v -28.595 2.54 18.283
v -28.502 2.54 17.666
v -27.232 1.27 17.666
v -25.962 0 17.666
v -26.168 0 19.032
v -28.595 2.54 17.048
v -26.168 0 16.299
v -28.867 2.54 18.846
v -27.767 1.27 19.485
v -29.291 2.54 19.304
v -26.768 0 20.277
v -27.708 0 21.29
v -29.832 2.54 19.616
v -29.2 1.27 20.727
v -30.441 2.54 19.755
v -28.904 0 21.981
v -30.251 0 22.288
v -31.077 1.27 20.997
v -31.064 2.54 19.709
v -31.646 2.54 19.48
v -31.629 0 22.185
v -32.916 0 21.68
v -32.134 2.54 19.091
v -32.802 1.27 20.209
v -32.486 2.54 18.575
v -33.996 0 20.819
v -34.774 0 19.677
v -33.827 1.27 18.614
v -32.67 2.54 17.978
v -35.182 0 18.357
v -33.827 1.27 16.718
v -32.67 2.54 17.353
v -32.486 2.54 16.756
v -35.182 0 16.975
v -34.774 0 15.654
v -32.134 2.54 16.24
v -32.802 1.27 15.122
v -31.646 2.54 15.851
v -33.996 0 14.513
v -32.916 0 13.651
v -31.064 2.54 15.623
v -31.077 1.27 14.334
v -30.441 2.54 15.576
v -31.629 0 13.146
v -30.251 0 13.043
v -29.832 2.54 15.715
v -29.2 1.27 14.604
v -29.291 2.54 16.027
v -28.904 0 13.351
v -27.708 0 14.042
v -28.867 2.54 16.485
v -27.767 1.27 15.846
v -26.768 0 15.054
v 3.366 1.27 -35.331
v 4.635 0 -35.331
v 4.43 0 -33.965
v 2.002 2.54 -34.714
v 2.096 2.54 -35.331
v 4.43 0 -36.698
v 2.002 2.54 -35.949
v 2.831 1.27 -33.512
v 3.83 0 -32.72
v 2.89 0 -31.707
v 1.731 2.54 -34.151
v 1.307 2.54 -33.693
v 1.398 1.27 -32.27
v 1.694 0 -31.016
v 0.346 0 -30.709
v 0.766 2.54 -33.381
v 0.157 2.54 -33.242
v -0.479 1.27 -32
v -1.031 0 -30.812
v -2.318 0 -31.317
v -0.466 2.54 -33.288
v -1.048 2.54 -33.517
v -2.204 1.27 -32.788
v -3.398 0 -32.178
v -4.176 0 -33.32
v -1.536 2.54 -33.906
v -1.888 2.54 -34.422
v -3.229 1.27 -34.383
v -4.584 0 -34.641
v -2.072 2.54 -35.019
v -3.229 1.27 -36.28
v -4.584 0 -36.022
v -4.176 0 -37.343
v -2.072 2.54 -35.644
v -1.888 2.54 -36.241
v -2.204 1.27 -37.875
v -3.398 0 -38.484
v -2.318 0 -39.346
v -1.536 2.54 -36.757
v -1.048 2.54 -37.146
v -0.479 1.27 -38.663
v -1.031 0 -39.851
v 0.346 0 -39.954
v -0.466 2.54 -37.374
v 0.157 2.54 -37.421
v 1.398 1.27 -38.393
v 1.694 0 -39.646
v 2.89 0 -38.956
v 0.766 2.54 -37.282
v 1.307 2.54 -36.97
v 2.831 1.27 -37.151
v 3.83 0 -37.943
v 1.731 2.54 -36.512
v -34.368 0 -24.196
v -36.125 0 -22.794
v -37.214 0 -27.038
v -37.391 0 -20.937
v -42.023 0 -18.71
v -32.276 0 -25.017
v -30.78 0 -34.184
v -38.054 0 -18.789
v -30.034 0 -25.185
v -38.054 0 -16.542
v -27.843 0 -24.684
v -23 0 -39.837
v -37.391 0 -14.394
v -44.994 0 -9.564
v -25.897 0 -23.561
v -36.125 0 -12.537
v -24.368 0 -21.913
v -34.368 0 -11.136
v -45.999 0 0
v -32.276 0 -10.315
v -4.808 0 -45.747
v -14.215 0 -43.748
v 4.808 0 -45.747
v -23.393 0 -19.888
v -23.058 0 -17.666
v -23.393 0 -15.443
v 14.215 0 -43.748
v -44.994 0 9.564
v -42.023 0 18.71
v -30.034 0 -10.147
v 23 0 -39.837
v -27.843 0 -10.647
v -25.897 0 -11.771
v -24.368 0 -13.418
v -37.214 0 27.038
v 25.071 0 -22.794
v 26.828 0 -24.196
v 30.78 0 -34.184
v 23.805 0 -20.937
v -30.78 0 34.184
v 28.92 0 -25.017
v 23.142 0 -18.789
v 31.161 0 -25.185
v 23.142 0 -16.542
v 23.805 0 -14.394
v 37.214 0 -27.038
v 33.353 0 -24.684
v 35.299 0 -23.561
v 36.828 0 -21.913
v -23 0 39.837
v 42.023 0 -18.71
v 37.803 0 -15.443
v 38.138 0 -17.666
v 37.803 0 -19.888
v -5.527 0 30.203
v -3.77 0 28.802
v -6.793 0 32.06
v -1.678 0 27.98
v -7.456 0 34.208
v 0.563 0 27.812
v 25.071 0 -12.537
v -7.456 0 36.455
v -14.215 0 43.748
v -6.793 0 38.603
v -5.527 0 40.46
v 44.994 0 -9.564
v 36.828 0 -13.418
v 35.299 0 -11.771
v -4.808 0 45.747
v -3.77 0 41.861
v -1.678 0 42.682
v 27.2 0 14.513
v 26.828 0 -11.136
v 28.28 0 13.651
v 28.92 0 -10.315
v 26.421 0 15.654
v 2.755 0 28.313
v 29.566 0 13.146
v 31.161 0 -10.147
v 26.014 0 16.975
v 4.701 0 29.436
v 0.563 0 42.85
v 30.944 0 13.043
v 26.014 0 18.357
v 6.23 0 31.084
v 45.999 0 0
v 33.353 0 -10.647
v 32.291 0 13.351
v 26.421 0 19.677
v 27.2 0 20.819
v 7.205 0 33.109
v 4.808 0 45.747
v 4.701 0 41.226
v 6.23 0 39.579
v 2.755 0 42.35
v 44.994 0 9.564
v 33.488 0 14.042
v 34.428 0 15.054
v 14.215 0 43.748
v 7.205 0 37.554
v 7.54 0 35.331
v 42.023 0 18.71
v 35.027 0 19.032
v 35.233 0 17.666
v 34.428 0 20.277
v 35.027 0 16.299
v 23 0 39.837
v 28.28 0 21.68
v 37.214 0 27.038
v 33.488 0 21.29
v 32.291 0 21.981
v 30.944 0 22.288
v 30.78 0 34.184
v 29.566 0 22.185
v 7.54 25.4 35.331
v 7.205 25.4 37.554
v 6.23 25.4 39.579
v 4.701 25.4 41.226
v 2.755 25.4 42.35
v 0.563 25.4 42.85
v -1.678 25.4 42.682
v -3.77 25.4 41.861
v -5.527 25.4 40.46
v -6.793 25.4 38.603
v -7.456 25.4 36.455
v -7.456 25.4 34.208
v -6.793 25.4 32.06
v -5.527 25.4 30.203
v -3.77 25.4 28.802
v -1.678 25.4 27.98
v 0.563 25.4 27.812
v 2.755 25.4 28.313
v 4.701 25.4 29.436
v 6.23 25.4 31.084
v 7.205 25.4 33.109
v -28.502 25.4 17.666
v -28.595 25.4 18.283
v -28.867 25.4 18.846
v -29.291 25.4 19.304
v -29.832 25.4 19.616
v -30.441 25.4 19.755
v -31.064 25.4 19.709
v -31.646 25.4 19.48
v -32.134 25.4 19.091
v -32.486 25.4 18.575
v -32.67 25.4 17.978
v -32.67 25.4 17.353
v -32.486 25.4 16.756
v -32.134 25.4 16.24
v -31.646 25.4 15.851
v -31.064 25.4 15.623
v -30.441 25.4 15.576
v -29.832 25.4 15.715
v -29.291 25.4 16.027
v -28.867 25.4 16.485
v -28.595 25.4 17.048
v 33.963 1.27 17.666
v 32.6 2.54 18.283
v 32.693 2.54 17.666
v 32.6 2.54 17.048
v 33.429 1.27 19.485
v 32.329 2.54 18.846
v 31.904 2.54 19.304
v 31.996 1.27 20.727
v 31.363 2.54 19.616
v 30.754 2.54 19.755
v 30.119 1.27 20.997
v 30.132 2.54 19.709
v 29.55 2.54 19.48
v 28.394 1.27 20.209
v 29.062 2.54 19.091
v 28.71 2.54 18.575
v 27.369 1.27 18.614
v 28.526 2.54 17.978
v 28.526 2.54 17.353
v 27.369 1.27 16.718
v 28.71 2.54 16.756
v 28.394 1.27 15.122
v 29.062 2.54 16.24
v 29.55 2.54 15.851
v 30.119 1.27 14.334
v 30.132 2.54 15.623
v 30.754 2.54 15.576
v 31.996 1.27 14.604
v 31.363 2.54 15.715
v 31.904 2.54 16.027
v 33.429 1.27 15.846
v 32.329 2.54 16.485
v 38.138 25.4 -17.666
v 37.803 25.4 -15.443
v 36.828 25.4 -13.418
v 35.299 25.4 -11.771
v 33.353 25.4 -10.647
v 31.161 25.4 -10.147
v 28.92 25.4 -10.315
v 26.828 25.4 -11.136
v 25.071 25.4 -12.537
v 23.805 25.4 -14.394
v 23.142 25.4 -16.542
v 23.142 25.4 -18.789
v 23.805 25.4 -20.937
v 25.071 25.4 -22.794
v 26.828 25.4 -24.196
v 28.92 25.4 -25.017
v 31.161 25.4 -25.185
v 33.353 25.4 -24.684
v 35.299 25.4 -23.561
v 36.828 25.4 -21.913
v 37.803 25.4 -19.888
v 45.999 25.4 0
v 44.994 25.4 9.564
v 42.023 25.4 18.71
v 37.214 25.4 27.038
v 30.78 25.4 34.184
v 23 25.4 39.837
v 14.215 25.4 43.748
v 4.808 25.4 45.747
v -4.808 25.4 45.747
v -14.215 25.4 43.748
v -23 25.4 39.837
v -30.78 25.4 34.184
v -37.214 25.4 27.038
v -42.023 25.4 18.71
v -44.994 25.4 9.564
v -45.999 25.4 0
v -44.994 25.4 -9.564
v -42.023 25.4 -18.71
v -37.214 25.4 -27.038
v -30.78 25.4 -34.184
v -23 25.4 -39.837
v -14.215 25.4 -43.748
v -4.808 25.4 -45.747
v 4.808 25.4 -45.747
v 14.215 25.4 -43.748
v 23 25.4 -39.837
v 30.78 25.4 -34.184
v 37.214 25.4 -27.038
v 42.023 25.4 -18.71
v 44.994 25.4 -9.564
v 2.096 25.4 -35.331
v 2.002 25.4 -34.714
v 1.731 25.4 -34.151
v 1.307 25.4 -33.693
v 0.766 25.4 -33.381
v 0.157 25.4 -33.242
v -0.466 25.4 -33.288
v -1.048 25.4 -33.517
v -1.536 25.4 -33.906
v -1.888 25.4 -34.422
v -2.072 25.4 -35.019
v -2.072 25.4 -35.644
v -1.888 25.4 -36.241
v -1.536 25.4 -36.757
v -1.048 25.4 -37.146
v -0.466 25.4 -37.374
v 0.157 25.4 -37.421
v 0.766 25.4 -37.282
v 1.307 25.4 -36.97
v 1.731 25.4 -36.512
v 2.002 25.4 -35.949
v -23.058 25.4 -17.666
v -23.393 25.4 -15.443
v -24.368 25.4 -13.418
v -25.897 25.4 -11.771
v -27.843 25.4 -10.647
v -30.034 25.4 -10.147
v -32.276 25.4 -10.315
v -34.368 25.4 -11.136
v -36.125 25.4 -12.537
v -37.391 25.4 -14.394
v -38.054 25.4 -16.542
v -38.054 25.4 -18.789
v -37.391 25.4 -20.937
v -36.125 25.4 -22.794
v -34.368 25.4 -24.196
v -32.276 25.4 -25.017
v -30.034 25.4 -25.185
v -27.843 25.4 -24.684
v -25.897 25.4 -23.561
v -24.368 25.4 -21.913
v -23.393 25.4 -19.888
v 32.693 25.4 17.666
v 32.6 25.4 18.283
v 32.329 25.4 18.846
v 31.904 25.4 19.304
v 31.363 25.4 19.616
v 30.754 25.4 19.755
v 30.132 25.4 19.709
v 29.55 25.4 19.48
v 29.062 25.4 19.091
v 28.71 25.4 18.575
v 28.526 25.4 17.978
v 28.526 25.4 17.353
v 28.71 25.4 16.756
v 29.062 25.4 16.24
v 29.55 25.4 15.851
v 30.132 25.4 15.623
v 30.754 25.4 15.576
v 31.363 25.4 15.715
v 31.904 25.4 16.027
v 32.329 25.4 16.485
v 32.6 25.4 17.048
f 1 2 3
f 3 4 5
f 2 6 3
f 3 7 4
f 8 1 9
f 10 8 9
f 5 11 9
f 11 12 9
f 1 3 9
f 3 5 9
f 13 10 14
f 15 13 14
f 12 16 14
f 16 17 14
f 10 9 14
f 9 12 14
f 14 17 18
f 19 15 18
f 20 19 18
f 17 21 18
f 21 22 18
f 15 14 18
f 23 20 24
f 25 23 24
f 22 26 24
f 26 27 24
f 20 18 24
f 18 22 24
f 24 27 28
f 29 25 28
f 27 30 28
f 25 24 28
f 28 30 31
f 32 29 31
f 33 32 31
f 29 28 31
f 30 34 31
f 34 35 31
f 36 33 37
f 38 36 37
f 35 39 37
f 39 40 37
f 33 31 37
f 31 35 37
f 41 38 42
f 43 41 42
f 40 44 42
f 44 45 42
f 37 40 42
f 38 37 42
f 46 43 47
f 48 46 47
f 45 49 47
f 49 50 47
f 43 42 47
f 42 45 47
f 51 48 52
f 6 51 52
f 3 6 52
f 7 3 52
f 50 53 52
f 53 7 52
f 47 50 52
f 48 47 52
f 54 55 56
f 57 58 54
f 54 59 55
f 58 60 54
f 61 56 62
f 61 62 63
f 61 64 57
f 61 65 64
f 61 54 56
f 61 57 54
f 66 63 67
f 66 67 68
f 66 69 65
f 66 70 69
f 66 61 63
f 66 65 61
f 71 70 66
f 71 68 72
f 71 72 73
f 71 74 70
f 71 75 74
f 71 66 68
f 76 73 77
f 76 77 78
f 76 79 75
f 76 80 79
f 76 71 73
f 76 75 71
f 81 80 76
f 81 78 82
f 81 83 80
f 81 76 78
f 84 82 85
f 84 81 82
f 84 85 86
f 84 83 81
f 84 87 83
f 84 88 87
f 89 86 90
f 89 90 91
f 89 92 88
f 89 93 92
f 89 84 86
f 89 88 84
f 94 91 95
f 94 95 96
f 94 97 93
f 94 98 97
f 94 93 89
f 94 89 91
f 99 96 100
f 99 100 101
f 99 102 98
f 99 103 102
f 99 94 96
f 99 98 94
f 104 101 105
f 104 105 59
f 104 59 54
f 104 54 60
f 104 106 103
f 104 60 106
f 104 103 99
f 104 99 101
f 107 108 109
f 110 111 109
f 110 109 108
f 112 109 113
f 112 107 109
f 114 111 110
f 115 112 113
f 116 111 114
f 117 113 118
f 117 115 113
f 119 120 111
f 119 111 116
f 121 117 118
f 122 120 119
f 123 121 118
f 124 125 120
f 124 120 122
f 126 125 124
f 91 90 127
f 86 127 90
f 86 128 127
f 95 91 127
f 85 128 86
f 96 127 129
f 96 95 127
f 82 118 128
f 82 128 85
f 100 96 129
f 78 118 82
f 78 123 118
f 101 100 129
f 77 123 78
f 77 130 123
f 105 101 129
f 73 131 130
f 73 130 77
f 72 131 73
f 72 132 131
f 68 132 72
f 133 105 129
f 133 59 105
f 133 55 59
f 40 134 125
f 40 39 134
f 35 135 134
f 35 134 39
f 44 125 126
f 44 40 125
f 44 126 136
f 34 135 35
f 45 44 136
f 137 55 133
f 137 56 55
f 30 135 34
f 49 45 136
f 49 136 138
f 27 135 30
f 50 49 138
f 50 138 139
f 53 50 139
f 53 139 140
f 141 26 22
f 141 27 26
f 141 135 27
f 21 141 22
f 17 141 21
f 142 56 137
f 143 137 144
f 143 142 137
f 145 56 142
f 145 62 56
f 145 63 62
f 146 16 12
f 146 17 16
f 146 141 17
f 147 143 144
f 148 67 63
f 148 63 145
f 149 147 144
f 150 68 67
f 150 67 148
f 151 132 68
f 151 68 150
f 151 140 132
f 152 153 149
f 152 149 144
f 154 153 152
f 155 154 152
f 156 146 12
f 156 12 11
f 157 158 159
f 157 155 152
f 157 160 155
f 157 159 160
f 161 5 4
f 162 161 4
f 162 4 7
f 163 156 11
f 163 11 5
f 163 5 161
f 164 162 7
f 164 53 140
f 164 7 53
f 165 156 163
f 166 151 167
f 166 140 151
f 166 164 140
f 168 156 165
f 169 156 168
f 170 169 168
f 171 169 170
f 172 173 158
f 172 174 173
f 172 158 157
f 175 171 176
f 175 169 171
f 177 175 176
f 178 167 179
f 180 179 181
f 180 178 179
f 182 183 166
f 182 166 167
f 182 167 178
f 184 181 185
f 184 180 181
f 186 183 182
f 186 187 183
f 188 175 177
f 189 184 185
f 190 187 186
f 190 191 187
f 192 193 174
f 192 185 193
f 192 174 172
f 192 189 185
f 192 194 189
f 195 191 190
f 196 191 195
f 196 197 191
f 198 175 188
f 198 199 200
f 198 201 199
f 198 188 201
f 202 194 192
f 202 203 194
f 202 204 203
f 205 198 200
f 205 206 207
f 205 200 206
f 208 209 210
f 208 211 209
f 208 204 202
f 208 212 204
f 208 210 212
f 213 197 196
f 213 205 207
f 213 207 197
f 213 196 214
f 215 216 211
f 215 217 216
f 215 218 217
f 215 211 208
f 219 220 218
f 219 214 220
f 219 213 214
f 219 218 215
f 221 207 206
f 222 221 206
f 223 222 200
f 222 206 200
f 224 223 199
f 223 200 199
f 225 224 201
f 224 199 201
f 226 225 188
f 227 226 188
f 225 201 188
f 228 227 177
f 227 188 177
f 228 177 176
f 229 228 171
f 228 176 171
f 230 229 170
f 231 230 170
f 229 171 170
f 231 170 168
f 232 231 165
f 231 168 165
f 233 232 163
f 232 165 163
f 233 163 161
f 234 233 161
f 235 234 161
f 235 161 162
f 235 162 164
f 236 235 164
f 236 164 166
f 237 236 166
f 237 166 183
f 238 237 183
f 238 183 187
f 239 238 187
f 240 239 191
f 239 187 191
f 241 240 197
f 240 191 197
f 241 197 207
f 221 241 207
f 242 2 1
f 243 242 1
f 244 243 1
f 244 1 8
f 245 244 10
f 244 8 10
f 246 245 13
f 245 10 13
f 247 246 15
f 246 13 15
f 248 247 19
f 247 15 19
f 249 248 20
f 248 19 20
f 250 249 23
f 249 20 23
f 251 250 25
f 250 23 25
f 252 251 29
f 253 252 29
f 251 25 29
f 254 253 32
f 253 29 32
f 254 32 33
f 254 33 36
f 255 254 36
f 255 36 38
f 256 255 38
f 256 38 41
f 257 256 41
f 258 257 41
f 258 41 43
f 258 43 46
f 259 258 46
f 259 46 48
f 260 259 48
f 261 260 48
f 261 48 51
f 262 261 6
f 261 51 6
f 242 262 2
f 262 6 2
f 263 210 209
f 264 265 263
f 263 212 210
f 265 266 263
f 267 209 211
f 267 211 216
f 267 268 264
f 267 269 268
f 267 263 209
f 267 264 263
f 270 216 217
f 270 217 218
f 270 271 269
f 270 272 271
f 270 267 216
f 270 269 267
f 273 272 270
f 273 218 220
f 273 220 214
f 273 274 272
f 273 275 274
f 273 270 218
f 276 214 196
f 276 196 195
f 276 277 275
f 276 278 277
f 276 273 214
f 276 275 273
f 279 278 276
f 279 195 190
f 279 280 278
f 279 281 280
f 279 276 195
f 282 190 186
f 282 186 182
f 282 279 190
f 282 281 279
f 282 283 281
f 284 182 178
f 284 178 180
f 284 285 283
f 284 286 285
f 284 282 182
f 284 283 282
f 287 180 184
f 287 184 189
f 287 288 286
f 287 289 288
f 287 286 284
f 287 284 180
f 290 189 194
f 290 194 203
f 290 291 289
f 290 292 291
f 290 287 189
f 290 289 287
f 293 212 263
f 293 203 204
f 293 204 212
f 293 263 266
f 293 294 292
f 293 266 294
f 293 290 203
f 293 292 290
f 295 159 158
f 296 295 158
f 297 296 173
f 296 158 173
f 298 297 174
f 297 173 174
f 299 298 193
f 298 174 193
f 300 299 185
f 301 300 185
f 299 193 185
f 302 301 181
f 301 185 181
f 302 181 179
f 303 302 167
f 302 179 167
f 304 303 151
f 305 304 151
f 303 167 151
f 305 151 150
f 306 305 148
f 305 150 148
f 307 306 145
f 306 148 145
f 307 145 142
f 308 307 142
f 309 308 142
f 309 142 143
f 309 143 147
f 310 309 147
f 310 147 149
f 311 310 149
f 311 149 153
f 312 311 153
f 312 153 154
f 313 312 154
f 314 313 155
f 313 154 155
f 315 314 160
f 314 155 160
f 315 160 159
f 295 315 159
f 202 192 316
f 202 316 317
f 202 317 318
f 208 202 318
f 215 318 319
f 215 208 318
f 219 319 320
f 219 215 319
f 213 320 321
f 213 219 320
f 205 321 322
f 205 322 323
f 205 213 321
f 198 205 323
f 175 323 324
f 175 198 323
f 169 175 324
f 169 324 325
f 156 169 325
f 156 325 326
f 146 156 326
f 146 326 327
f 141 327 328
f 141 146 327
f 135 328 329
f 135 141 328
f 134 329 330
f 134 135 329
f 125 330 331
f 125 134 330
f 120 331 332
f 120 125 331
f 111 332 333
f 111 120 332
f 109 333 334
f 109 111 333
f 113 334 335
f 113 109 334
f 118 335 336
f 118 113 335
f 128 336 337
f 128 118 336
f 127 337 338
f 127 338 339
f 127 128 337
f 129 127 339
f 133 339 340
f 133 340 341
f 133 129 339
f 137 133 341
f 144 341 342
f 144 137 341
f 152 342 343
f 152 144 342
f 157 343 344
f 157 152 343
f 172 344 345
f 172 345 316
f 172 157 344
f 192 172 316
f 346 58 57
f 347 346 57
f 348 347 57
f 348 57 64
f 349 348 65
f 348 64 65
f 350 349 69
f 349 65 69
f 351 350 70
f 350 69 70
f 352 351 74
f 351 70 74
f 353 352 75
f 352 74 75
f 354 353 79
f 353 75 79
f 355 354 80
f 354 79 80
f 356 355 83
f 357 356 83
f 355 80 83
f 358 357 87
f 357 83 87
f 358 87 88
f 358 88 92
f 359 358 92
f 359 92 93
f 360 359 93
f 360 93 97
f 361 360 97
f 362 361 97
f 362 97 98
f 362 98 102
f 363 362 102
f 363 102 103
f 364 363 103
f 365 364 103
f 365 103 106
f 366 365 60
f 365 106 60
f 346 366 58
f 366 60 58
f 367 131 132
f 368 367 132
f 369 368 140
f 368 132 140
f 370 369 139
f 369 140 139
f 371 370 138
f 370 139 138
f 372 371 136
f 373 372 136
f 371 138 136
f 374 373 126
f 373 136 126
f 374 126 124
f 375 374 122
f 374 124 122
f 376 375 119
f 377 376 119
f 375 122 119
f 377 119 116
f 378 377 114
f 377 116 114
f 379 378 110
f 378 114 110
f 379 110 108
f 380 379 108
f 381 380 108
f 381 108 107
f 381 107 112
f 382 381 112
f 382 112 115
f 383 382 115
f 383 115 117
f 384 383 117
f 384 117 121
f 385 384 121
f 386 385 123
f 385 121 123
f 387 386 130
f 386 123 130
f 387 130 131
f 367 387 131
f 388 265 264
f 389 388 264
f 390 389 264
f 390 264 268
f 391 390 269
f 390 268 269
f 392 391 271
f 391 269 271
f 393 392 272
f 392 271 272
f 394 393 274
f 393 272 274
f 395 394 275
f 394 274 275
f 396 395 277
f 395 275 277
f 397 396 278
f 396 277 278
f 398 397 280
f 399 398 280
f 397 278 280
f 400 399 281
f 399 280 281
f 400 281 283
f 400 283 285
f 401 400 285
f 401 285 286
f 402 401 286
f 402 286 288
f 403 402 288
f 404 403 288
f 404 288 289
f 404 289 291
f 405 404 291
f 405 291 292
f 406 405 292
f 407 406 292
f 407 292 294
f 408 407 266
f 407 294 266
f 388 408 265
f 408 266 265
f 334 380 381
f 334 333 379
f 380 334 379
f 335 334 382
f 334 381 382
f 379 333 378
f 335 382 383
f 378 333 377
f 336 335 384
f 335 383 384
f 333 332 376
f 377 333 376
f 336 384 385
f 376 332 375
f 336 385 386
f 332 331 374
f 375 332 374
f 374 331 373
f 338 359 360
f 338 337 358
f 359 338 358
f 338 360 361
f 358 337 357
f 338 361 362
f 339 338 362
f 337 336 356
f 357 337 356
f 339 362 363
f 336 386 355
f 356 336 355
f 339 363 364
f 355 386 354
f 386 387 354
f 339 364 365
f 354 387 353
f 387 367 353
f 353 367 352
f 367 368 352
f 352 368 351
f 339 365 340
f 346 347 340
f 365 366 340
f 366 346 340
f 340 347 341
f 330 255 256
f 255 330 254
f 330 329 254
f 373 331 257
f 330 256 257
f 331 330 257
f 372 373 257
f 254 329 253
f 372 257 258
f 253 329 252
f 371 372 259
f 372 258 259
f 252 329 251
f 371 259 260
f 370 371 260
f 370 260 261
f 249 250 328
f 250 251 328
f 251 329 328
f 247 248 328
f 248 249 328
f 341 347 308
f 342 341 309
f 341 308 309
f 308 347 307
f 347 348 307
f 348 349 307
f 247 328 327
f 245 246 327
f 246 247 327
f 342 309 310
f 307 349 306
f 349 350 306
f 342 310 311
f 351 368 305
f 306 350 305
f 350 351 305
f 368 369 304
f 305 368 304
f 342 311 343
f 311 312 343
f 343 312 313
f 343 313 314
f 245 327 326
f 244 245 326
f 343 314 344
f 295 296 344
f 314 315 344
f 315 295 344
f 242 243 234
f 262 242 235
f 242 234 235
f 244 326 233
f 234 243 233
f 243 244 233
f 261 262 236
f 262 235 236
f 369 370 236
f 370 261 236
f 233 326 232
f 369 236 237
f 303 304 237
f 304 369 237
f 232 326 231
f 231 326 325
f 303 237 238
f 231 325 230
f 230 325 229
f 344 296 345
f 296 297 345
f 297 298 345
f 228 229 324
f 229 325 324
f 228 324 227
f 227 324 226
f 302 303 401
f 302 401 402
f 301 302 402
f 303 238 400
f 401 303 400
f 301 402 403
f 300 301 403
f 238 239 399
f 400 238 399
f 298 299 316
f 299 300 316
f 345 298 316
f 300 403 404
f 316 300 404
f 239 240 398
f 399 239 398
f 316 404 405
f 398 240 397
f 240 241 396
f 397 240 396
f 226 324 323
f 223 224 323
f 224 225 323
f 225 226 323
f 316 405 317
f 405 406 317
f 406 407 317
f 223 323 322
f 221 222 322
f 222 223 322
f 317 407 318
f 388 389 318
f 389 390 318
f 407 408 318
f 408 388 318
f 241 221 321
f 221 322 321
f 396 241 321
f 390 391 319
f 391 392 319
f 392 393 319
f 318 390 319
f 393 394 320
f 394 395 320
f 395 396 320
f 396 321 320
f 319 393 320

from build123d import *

# Parameters (mm, degrees)
F0_R     = 45.9994
F0_R_2   = 7.53999
F0_R_3   = 2.0955
F1_DEPTH = 25.4
F2_SIZE  = 2.54
F3_SIZE  = 2.54
F4_SIZE  = 2.54


with BuildPart() as f1:
    # F0 (on Front) → F1 (new body)
    with BuildSketch(Plane.XZ):
        Circle(F0_R)
        with Locations((-30.59789, -17.6657)):
            Circle(F0_R_2, mode=Mode.SUBTRACT)
        with Locations((0, -35.3314)):
            Circle(F0_R_3, mode=Mode.SUBTRACT)
        with Locations((30.59789, -17.6657)):
            Circle(F0_R_2, mode=Mode.SUBTRACT)
        with Locations((-30.59789, 17.6657)):
            Circle(F0_R_3, mode=Mode.SUBTRACT)
        with Locations((30.59789, 17.6657)):
            Circle(F0_R_3, mode=Mode.SUBTRACT)
        with Locations((0, 35.3314)):
            Circle(F0_R_2, mode=Mode.SUBTRACT)
    extrude(amount=-F1_DEPTH)

    # F2
    f2_edges = [f1.edges().sort_by_distance(p)[0] for p in [
        (-32.69339, 0, 17.6657),
    ]]
    chamfer(f2_edges, length=F2_SIZE)

    # F3
    f3_edges = [f1.edges().sort_by_distance(p)[0] for p in [
        (28.50239, 0, 17.6657),
    ]]
    chamfer(f3_edges, length=F3_SIZE)

    # F4
    f4_edges = [f1.edges().sort_by_distance(p)[0] for p in [
        (-2.0955, 0, -35.3314),
    ]]
    chamfer(f4_edges, length=F4_SIZE)


solid = f1.part
